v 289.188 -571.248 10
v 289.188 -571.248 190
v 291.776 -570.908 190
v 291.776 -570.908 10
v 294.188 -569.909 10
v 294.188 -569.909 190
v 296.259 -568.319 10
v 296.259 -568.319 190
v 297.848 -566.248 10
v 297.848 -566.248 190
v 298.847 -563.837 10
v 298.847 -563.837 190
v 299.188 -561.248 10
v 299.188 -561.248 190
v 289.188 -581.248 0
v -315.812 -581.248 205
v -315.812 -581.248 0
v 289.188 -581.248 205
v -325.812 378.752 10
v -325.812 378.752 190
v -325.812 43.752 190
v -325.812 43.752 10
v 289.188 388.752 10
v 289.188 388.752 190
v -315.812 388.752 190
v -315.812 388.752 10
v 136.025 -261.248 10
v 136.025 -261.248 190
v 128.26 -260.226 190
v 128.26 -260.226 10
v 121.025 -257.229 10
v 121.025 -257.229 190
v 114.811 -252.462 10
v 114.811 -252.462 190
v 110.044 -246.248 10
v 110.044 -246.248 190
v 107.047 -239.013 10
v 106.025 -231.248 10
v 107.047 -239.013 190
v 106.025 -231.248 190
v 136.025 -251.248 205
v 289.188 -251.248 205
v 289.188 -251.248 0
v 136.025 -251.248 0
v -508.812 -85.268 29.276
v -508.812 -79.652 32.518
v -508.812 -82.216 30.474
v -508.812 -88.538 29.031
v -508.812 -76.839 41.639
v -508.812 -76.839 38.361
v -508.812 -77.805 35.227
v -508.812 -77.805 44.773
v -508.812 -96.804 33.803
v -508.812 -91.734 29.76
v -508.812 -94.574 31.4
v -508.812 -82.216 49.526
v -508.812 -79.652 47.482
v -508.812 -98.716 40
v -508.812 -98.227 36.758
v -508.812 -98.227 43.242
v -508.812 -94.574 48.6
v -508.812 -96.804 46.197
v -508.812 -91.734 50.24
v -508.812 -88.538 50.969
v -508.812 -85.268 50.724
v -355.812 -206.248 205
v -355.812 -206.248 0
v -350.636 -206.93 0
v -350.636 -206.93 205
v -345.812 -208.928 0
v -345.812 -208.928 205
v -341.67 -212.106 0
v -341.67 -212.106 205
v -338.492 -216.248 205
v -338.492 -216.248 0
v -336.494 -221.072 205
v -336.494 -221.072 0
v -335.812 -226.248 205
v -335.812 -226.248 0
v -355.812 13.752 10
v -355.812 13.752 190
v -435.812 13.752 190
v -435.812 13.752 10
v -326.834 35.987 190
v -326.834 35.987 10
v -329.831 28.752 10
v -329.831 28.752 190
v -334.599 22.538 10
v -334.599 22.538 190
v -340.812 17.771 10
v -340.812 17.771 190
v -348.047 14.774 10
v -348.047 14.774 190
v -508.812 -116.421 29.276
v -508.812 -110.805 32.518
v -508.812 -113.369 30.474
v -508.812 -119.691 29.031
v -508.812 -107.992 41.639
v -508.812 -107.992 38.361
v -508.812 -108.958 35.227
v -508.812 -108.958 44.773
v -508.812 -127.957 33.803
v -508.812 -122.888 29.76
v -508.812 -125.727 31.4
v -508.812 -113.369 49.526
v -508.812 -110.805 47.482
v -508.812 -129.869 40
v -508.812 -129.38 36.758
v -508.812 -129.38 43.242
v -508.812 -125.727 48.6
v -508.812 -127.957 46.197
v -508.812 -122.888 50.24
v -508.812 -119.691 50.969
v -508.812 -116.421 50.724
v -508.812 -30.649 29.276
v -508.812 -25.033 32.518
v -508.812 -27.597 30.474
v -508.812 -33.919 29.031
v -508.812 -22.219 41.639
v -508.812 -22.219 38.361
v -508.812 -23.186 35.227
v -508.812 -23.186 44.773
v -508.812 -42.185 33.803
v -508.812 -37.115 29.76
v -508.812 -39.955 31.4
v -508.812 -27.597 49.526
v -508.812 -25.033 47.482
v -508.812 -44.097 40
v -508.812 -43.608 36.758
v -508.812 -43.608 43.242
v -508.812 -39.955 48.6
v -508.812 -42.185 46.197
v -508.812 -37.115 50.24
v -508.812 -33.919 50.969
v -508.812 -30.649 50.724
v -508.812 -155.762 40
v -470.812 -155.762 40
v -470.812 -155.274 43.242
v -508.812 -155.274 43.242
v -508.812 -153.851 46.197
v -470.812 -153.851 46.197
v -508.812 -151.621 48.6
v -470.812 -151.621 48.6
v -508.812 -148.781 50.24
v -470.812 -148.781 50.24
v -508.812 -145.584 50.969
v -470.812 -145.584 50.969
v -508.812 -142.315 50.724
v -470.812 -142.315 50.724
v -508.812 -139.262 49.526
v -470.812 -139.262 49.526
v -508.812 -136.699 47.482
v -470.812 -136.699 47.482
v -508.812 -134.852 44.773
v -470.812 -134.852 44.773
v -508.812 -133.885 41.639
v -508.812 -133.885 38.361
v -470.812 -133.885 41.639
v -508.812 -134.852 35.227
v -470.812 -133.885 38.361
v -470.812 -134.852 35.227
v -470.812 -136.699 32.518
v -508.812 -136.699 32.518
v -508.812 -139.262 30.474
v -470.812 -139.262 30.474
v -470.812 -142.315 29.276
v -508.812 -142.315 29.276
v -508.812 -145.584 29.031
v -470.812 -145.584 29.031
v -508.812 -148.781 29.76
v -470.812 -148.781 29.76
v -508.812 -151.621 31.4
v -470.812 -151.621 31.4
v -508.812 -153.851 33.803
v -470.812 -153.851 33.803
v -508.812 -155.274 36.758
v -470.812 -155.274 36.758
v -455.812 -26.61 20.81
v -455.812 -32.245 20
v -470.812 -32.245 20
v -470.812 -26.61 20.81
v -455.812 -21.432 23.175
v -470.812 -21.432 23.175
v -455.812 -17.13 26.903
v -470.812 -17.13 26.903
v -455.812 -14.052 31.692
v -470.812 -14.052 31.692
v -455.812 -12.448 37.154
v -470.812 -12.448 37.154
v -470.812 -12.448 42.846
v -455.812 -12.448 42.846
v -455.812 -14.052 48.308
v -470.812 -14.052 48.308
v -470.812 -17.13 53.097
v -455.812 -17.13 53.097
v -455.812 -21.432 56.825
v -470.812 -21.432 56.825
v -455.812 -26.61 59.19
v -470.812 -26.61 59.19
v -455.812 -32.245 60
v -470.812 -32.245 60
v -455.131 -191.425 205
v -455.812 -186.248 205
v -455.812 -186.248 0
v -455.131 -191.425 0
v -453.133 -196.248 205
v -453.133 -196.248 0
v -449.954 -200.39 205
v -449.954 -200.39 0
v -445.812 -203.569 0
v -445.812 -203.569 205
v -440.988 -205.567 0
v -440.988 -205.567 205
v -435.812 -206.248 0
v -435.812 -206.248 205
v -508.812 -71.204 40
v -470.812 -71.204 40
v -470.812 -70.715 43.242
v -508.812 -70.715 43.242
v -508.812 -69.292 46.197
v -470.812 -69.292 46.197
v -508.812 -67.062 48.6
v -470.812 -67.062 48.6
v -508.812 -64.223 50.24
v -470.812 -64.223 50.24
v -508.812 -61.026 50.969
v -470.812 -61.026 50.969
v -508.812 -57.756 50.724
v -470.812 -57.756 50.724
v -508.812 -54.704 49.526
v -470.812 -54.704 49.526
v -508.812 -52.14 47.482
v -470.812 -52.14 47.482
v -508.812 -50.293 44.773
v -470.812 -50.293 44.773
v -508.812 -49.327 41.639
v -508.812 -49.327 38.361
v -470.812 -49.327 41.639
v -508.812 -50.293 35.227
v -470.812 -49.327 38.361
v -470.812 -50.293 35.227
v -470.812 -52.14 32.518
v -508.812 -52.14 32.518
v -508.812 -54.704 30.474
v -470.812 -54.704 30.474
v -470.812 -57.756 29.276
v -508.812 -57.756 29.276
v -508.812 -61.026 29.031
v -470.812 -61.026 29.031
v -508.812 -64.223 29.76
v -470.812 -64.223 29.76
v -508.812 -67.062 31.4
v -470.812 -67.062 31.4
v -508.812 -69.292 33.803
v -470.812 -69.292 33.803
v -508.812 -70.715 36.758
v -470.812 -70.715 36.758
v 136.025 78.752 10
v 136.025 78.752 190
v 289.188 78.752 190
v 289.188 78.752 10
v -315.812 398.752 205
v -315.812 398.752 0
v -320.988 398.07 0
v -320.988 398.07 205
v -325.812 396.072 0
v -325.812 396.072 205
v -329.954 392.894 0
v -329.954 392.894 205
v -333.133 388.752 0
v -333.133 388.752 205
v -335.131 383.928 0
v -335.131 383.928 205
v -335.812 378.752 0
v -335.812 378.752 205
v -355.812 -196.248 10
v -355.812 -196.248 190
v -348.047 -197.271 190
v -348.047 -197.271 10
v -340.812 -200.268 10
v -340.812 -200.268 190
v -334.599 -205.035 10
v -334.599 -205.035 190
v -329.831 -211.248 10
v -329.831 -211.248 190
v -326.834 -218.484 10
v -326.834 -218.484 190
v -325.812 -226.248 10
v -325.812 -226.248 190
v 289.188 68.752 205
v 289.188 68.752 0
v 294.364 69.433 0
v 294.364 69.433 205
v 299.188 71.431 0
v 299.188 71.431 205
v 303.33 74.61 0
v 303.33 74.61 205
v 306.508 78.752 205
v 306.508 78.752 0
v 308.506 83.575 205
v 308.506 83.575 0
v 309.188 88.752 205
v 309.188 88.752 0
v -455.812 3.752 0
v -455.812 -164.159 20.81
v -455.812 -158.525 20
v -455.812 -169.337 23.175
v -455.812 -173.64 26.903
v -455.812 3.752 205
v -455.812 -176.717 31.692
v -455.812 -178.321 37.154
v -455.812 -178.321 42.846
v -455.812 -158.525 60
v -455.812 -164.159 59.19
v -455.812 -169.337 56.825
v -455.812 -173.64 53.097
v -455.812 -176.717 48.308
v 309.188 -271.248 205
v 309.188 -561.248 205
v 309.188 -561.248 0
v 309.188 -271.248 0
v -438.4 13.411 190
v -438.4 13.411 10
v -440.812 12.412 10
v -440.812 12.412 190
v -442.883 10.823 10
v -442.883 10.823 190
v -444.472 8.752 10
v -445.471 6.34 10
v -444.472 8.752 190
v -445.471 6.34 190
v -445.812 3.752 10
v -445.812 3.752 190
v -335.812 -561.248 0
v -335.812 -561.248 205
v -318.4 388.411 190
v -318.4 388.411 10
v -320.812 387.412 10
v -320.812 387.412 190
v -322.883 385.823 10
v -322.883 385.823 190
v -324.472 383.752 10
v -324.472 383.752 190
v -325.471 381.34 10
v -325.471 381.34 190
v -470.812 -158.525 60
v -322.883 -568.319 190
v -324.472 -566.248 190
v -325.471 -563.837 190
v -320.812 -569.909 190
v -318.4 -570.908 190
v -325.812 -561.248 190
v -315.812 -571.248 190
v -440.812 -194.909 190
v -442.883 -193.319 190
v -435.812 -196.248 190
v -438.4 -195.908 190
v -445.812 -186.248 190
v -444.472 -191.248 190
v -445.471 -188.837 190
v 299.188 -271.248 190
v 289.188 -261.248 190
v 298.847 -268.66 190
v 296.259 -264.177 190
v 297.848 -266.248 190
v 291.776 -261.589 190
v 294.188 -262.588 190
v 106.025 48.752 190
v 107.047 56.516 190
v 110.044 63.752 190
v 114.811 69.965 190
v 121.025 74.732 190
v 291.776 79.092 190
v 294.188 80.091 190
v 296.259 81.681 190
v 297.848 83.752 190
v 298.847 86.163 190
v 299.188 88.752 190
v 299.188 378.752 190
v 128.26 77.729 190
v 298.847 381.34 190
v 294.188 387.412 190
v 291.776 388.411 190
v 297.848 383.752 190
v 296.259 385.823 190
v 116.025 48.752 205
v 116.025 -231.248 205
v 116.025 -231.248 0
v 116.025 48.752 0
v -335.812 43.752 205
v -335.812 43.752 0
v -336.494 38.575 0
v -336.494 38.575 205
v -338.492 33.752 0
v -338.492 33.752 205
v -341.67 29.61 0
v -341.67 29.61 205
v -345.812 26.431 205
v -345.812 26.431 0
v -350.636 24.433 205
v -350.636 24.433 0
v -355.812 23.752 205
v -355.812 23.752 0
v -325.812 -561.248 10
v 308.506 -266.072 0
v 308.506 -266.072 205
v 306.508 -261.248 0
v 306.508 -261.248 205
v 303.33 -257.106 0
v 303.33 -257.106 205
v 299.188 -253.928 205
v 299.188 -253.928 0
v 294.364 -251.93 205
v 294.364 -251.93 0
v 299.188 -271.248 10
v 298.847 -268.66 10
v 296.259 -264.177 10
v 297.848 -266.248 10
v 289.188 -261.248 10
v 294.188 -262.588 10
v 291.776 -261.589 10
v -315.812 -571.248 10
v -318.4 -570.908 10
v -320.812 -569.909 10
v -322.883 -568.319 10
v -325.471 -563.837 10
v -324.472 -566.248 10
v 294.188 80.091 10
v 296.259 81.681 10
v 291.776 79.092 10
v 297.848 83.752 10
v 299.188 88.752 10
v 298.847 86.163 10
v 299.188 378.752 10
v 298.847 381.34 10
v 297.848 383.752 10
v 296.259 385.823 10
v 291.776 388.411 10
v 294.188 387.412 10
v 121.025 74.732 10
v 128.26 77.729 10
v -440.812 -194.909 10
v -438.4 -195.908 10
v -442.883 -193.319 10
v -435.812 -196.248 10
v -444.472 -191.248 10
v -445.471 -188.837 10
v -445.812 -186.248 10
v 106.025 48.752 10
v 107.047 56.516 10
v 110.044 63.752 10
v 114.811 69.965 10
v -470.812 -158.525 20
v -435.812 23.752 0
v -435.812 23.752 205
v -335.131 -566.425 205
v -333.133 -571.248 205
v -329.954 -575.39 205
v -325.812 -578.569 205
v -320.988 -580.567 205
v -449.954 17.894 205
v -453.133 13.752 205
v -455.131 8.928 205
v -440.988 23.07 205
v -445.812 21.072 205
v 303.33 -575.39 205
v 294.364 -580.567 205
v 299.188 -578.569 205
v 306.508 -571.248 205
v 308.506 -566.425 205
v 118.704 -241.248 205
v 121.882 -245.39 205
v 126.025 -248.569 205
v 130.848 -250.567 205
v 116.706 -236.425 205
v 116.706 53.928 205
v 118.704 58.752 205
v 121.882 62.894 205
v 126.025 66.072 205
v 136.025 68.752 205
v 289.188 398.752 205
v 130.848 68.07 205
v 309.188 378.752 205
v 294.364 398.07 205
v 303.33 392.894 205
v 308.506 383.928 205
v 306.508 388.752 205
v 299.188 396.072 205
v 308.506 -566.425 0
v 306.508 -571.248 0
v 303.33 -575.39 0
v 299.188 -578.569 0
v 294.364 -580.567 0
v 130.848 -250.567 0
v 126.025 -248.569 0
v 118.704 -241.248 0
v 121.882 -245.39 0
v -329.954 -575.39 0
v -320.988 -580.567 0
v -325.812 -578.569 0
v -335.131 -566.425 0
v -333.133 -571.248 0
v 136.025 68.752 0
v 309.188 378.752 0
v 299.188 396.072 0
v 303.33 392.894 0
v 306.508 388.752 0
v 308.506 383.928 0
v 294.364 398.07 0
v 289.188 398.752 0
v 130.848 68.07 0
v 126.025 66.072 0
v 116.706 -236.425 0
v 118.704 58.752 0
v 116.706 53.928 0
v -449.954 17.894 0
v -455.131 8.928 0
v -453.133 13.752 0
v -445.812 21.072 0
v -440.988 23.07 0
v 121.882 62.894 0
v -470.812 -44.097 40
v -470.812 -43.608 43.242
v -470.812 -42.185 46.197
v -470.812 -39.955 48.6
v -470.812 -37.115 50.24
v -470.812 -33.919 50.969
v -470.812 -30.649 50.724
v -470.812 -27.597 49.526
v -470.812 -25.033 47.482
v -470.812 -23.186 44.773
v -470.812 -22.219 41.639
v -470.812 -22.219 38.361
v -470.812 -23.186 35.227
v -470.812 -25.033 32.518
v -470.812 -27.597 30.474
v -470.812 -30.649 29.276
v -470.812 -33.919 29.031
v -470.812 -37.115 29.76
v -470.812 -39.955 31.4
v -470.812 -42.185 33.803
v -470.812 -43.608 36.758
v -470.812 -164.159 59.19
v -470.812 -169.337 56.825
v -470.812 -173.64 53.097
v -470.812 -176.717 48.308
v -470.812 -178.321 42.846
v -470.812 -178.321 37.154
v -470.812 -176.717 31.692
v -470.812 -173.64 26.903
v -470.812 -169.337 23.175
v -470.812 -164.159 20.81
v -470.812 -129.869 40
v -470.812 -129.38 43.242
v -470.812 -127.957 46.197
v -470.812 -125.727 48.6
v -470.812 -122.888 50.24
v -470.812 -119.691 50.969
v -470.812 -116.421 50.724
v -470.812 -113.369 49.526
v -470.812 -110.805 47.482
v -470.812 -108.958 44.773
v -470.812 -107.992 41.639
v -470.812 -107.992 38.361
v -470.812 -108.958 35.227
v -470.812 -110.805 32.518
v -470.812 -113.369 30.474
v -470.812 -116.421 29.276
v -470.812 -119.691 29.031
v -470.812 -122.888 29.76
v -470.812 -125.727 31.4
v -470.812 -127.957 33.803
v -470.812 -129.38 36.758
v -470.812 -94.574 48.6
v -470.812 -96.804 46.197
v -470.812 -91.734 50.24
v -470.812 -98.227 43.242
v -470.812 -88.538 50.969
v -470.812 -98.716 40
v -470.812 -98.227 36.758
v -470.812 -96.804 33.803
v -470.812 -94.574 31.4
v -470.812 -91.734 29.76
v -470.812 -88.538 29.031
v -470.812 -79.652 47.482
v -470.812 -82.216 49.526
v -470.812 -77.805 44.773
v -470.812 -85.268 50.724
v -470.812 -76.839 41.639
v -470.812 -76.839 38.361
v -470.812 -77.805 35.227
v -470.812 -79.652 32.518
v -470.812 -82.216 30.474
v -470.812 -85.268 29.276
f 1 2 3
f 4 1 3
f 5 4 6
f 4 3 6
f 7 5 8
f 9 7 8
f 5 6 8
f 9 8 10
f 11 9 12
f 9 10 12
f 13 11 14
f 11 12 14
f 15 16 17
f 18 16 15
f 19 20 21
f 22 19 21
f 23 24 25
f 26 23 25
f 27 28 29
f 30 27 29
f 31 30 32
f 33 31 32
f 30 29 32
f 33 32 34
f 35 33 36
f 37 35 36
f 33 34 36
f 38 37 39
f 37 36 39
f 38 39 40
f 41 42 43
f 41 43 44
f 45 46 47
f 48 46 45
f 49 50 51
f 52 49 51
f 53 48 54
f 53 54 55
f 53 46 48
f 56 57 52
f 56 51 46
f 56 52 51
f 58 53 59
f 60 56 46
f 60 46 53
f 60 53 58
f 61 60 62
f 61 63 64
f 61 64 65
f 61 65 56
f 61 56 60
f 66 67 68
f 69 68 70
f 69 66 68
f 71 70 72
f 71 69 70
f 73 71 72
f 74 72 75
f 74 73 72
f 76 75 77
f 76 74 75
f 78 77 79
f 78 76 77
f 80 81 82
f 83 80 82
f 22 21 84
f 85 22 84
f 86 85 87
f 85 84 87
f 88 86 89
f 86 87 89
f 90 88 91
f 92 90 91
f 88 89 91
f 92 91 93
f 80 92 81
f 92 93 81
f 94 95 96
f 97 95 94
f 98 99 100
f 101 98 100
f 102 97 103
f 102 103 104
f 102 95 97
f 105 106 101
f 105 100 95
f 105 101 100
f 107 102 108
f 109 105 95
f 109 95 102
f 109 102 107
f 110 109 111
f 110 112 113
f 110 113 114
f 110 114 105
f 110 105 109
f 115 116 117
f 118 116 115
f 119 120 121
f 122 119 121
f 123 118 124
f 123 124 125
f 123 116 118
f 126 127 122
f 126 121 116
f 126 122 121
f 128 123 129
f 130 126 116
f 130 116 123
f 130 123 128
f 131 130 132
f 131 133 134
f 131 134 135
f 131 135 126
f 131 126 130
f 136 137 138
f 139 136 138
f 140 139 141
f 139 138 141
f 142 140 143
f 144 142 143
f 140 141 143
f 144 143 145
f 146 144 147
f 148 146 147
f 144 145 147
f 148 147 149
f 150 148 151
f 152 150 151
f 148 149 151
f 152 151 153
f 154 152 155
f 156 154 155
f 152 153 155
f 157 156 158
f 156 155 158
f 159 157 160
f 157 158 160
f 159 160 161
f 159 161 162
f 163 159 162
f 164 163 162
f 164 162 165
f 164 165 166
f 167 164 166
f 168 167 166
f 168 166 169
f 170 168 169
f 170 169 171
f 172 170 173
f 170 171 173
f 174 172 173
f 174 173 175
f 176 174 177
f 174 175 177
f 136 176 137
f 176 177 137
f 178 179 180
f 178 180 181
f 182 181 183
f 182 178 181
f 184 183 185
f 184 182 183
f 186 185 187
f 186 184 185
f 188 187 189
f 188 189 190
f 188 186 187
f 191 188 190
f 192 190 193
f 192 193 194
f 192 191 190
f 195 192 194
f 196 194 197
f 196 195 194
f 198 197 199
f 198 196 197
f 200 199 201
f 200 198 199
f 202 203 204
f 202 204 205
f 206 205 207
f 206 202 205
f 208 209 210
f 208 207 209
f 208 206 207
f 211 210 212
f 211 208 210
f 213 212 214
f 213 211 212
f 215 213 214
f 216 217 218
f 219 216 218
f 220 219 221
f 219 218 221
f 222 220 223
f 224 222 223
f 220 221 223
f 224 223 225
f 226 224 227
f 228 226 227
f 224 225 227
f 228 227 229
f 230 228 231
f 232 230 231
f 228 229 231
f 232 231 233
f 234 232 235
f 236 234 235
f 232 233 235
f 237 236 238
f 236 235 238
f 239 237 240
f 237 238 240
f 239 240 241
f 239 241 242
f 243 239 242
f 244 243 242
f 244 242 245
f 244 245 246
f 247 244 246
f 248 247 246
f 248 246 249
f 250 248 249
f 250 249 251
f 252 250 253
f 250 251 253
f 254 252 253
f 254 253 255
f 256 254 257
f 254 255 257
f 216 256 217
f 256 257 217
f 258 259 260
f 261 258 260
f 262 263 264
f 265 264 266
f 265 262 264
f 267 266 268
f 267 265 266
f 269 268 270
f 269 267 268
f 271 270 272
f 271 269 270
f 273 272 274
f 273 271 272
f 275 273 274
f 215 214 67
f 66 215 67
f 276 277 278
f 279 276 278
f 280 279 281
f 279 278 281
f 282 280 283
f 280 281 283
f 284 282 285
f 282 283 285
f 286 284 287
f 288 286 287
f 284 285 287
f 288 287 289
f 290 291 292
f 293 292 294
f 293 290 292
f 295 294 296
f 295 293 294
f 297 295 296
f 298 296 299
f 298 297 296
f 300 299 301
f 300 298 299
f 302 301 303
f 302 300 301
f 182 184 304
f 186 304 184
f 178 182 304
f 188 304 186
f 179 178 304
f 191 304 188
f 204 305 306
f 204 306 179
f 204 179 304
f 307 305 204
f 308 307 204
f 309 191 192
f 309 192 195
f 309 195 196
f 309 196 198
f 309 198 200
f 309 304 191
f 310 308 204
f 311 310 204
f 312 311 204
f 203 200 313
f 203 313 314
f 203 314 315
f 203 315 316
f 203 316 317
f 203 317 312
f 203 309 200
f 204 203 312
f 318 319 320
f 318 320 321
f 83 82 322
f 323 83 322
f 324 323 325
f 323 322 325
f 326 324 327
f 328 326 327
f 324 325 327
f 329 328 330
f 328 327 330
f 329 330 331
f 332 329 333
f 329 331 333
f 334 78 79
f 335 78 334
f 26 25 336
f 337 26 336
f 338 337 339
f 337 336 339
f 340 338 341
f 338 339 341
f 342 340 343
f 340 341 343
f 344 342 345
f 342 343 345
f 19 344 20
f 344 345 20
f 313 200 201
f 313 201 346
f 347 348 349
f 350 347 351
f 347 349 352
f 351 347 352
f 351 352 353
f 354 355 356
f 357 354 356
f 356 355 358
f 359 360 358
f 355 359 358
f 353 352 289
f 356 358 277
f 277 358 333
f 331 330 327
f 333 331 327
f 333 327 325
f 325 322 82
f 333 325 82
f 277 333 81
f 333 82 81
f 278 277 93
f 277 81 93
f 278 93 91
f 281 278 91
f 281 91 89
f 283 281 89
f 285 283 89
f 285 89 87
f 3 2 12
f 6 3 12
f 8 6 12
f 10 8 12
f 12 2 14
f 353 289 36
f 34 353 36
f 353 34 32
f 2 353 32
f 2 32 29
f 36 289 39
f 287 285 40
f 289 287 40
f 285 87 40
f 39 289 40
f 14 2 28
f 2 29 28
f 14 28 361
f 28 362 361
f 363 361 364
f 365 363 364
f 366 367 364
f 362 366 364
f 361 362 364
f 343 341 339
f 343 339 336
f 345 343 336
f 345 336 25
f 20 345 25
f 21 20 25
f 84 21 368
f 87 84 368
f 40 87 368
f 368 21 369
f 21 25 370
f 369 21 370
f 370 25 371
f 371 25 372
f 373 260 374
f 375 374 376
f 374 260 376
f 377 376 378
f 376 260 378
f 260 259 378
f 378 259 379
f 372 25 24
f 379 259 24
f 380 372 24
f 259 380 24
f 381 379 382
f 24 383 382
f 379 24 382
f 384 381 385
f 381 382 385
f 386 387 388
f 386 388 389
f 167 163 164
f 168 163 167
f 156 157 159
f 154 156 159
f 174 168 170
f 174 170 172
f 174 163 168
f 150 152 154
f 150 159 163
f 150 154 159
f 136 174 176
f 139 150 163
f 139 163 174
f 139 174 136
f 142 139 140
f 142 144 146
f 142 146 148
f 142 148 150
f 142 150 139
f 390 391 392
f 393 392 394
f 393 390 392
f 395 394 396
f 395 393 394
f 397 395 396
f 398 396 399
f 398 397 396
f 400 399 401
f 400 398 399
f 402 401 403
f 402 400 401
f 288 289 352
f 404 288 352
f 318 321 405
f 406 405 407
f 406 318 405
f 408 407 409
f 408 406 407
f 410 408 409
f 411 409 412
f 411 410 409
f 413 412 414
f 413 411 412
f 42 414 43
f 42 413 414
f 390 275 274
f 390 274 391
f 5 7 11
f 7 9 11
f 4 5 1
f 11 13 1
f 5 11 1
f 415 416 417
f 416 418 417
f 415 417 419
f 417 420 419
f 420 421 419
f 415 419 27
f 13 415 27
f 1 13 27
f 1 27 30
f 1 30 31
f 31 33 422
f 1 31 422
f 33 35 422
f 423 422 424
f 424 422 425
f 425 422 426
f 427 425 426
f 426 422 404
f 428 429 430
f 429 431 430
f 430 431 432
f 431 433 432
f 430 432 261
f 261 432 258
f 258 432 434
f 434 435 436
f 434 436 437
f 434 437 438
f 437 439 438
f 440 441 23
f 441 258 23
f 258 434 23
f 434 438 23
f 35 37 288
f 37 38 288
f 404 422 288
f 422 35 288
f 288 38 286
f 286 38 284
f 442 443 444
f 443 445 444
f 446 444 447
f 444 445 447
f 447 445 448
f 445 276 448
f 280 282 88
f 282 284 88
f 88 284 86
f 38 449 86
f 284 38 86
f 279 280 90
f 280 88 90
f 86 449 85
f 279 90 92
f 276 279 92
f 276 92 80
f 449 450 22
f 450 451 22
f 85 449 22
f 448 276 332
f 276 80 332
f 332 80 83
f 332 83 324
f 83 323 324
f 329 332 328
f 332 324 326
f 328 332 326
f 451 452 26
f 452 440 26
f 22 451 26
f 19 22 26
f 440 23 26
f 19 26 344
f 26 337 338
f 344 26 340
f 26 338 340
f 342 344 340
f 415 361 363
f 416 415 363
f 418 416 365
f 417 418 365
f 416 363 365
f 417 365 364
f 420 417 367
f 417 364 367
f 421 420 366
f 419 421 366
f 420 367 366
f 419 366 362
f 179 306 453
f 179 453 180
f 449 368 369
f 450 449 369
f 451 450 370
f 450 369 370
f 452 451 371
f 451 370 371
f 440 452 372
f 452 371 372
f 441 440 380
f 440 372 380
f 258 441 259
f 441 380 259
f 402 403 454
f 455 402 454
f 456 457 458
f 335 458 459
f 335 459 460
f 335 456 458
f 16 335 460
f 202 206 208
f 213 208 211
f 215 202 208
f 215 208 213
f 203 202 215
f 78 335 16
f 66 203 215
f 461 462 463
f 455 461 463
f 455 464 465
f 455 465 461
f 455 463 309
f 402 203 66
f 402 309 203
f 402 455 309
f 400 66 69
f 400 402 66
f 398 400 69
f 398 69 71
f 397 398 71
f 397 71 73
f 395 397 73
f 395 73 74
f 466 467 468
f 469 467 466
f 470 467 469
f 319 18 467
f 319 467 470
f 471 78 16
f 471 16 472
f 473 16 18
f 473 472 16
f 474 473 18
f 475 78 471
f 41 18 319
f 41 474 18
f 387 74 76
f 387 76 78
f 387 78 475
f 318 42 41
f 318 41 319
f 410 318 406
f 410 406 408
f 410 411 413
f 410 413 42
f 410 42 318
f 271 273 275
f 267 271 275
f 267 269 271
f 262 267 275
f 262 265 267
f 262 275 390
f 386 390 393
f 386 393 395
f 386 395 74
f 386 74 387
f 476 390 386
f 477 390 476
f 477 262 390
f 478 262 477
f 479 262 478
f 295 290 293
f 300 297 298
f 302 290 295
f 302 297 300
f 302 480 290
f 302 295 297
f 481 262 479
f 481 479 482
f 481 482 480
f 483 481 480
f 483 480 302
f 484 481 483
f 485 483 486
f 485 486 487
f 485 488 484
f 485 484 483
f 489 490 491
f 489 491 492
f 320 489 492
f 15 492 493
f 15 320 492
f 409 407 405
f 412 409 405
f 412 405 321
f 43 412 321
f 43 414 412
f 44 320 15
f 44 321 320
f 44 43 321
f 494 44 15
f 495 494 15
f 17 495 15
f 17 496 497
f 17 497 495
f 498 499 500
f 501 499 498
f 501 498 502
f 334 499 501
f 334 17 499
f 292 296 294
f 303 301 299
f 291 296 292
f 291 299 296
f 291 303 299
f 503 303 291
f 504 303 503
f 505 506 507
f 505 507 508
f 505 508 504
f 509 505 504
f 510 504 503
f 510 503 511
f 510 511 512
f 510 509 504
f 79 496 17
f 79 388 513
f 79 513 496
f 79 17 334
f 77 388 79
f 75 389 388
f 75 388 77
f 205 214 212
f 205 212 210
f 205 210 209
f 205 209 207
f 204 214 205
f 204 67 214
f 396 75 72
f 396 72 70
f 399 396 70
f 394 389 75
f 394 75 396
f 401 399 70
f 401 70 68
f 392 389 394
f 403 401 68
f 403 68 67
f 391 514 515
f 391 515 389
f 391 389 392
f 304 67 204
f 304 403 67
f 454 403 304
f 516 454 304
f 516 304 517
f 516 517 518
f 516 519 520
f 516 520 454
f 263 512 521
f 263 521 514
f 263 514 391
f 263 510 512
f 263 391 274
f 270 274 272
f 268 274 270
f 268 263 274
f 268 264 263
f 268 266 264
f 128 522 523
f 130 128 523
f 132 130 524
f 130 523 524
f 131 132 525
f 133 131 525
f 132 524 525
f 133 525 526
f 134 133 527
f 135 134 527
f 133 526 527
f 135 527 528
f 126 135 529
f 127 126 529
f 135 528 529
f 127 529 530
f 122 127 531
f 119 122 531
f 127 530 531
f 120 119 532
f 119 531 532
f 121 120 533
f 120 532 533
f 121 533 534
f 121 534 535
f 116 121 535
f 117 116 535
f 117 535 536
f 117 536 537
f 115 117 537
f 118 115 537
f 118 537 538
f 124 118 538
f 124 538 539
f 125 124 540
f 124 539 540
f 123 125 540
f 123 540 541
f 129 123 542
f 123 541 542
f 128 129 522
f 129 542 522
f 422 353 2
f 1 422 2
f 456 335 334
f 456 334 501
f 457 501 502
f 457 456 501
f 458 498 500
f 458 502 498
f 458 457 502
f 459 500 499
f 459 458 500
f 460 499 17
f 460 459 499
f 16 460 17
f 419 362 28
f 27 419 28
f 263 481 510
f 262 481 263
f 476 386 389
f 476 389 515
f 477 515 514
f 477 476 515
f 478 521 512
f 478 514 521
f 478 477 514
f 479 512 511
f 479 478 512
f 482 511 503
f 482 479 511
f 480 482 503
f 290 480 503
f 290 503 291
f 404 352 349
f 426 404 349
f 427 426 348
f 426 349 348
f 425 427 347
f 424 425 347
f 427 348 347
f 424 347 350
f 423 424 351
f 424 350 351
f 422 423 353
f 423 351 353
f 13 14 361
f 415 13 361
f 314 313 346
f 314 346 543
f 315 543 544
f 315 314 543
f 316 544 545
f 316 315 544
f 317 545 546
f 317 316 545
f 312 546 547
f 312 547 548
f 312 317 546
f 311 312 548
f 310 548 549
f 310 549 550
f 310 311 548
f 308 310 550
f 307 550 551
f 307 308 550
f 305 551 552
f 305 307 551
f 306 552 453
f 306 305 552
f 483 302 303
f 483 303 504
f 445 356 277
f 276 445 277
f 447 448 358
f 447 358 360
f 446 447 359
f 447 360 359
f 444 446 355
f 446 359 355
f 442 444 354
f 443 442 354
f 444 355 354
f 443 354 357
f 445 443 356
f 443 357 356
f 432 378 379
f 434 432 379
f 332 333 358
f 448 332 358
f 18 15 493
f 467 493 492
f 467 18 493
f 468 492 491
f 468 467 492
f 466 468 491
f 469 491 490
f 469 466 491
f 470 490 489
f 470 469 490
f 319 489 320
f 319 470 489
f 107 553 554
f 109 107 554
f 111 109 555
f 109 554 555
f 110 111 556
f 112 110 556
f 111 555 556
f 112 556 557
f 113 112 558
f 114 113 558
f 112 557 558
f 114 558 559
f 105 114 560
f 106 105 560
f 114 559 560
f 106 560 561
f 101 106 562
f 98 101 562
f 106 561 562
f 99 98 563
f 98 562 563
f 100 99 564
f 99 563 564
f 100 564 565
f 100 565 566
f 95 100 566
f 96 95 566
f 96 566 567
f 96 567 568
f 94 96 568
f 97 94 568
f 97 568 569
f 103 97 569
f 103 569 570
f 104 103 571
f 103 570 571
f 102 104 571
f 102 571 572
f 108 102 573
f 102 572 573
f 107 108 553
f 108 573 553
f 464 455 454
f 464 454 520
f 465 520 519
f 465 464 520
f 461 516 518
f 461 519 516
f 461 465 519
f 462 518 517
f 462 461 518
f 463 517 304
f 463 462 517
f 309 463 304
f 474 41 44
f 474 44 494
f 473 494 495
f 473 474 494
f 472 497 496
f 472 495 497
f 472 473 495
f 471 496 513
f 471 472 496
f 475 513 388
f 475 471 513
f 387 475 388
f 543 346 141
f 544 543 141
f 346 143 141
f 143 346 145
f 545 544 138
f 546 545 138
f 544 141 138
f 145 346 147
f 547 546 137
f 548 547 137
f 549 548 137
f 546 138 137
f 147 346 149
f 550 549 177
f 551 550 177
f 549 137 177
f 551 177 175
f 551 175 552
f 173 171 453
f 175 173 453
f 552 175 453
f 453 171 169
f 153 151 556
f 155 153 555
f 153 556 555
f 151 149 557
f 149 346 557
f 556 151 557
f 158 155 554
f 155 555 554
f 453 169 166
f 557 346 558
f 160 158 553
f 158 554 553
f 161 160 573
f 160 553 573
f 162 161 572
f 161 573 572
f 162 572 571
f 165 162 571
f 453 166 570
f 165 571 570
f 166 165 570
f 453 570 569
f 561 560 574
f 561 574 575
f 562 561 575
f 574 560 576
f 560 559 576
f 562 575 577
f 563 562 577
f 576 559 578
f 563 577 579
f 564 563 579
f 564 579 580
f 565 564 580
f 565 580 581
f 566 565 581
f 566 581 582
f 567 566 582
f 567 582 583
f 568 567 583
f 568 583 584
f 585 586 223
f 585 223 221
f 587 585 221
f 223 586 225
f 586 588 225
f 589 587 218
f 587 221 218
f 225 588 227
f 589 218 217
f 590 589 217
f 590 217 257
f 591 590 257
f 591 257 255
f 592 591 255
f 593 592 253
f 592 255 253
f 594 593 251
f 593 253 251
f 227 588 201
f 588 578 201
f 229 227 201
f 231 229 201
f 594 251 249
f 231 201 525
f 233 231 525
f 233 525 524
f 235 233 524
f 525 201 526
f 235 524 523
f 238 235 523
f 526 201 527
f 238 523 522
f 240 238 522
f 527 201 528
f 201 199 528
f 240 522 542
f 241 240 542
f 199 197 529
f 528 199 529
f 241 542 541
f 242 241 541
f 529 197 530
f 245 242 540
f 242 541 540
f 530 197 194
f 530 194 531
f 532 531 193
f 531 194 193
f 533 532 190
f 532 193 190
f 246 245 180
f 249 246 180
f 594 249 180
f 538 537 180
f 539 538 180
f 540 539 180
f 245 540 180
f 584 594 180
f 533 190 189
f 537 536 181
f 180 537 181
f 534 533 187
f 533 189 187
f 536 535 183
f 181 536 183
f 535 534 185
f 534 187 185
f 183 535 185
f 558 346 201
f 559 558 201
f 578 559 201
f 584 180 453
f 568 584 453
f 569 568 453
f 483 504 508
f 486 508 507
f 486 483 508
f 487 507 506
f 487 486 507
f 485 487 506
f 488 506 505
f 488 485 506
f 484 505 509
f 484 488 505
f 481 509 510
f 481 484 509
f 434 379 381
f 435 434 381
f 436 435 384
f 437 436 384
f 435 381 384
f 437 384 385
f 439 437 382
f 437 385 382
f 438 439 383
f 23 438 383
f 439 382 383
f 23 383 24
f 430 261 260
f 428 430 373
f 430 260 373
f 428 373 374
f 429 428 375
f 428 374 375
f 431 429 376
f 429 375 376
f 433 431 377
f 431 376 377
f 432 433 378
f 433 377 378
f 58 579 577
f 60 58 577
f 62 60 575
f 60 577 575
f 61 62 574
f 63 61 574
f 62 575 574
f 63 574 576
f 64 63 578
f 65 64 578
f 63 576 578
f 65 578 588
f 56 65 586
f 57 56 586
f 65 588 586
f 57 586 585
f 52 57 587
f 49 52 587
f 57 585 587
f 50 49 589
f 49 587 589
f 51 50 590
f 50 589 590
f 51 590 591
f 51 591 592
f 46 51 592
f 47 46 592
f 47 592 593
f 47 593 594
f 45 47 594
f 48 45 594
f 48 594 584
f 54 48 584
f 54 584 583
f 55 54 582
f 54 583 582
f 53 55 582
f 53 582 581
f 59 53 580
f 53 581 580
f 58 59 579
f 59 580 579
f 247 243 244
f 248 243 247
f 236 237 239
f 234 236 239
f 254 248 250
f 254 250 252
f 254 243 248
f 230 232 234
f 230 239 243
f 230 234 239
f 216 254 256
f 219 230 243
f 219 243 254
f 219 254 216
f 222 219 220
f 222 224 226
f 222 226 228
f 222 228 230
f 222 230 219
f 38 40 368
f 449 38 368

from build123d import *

# Parameters (mm, degrees)
BOSS_EXTRUDE1_DEPTH = 10
FILLET1_R           = 20
BOSS_EXTRUDE2_START = 180
BOSS_EXTRUDE2_DEPTH = 180
BOSS_EXTRUDE3_START = 15
BOSS_EXTRUDE3_DEPTH = 15
BOSS_EXTRUDE4_DEPTH = 15
BOSS_EXTRUDE5_START = 15
SKETCH4_3_R         = 11
BOSS_EXTRUDE5_DEPTH = 38


with BuildPart() as part:
    # Sketch1 → Boss-Extrude1 (new body)
    with BuildSketch(Plane.XY):
        Polygon((-335.812036678, 398.75165032), (309.187963322, 398.75165032), (309.187963322, 68.75165032), (116.024594022, 68.75165032), (116.024594022, -251.24834968), (309.187963322, -251.24834968), (309.187963322, -581.24834968), (-335.812036678, -581.24834968), (-335.812036678, -206.24834968), (-455.812036678, -206.24834968), (-455.812036678, 23.75165032), (-335.812036678, 23.75165032), align=None)
    extrude(amount=BOSS_EXTRUDE1_DEPTH)

    # Fillet1
    fillet1_edges = [part.edges().sort_by_distance(p)[0] for p in [
        (-335.812036678, -206.24834968, 5),
        (-455.812036678, -206.24834968, 5),
        (-455.812036678, 23.75165032, 5),
        (-335.812036678, 23.75165032, 5),
        (-335.812036678, 398.75165032, 5),
        (309.187963322, 398.75165032, 5),
        (309.187963322, 68.75165032, 5),
        (116.024594022, 68.75165032, 5),
        (116.024594022, -251.24834968, 5),
        (309.187963322, -251.24834968, 5),
        (309.187963322, -581.24834968, 5),
        (-335.812036678, -581.24834968, 5),
    ]]
    fillet(fillet1_edges, radius=FILLET1_R)

    # Sketch2 → Boss-Extrude2 (add)
    with BuildSketch(Plane.XY.offset(10).offset(BOSS_EXTRUDE2_START)):
        with BuildLine():
            Line((309.187963322, 88.75165032), (309.187963322, 378.75165032))
            ThreePointArc((309.187963322, 378.75165032), (303.330098945, 392.893785944), (289.187963322, 398.75165032))
            Line((289.187963322, 398.75165032), (-315.812036678, 398.75165032))
            ThreePointArc((-315.812036678, 398.75165032), (-329.954172302, 392.893785944), (-335.812036678, 378.75165032))
            Line((-335.812036678, 378.75165032), (-335.812036678, 43.75165032))
            ThreePointArc((-335.812036678, 43.75165032), (-341.669901055, 29.609514696), (-355.812036678, 23.75165032))
            Line((-355.812036678, 23.75165032), (-435.812036678, 23.75165032))
            ThreePointArc((-435.812036678, 23.75165032), (-449.954172302, 17.893785944), (-455.812036678, 3.75165032))
            Line((-455.812036678, 3.75165032), (-455.812036678, -186.24834968))
            ThreePointArc((-455.812036678, -186.24834968), (-449.954172302, -200.390485304), (-435.812036678, -206.24834968))
            Line((-435.812036678, -206.24834968), (-355.812036678, -206.24834968))
            ThreePointArc((-355.812036678, -206.24834968), (-341.669901055, -212.106214056), (-335.812036678, -226.24834968))
            Line((-335.812036678, -226.24834968), (-335.812036678, -561.24834968))
            ThreePointArc((-335.812036678, -561.24834968), (-329.954172302, -575.390485304), (-315.812036678, -581.24834968))
            Line((-315.812036678, -581.24834968), (289.187963322, -581.24834968))
            ThreePointArc((289.187963322, -581.24834968), (303.330098945, -575.390485304), (309.187963322, -561.24834968))
            Line((309.187963322, -561.24834968), (309.187963322, -271.24834968))
            ThreePointArc((309.187963322, -271.24834968), (303.330098945, -257.106214056), (289.187963322, -251.24834968))
            Line((289.187963322, -251.24834968), (136.024594022, -251.24834968))
            ThreePointArc((136.024594022, -251.24834968), (121.882458398, -245.390485304), (116.024594022, -231.24834968))
            Line((116.024594022, -231.24834968), (116.024594022, 48.75165032))
            ThreePointArc((116.024594022, 48.75165032), (121.882458398, 62.893785944), (136.024594022, 68.75165032))
            Line((136.024594022, 68.75165032), (289.187963322, 68.75165032))
            ThreePointArc((289.187963322, 68.75165032), (303.330098945, 74.609514696), (309.187963322, 88.75165032))
        make_face()
        with BuildLine():
            Line((299.187963322, 88.75165032), (299.187963322, 378.75165032))
            ThreePointArc((299.187963322, 378.75165032), (296.259031134, 385.822718132), (289.187963322, 388.75165032))
            Line((289.187963322, 388.75165032), (-315.812036678, 388.75165032))
            ThreePointArc((-315.812036678, 388.75165032), (-322.88310449, 385.822718132), (-325.812036678, 378.75165032))
            Line((-325.812036678, 378.75165032), (-325.812036678, 43.75165032))
            ThreePointArc((-325.812036678, 43.75165032), (-334.598833243, 22.538446884), (-355.812036678, 13.75165032))
            Line((-355.812036678, 13.75165032), (-435.812036678, 13.75165032))
            ThreePointArc((-435.812036678, 13.75165032), (-442.88310449, 10.822718132), (-445.812036678, 3.75165032))
            Line((-445.812036678, 3.75165032), (-445.812036678, -186.24834968))
            ThreePointArc((-445.812036678, -186.24834968), (-442.88310449, -193.319417492), (-435.812036678, -196.24834968))
            Line((-435.812036678, -196.24834968), (-355.812036678, -196.24834968))
            ThreePointArc((-355.812036678, -196.24834968), (-334.598833243, -205.035146245), (-325.812036678, -226.24834968))
            Line((-325.812036678, -226.24834968), (-325.812036678, -561.24834968))
            ThreePointArc((-325.812036678, -561.24834968), (-322.88310449, -568.319417492), (-315.812036678, -571.24834968))
            Line((-315.812036678, -571.24834968), (289.187963322, -571.24834968))
            ThreePointArc((289.187963322, -571.24834968), (296.259031134, -568.319417492), (299.187963322, -561.24834968))
            Line((299.187963322, -561.24834968), (299.187963322, -271.24834968))
            ThreePointArc((299.187963322, -271.24834968), (296.259031134, -264.177281868), (289.187963322, -261.24834968))
            Line((289.187963322, -261.24834968), (136.024594022, -261.24834968))
            ThreePointArc((136.024594022, -261.24834968), (114.811390587, -252.461553116), (106.024594022, -231.24834968))
            Line((106.024594022, -231.24834968), (106.024594022, 48.75165032))
            ThreePointArc((106.024594022, 48.75165032), (114.811390587, 69.964853755), (136.024594022, 78.75165032))
            Line((136.024594022, 78.75165032), (289.187963322, 78.75165032))
            ThreePointArc((289.187963322, 78.75165032), (296.259031134, 81.680582508), (299.187963322, 88.75165032))
        make_face(mode=Mode.SUBTRACT)
    extrude(amount=-BOSS_EXTRUDE2_DEPTH)

    # Sketch3 → Boss-Extrude3 (add)
    with BuildSketch(Plane.XY.offset(190).offset(BOSS_EXTRUDE3_START)):
        with BuildLine():
            Line((309.187963322, 88.75165032), (309.187963322, 378.75165032))
            ThreePointArc((309.187963322, 378.75165032), (303.330098945, 392.893785944), (289.187963322, 398.75165032))
            Line((289.187963322, 398.75165032), (-315.812036678, 398.75165032))
            ThreePointArc((-315.812036678, 398.75165032), (-329.954172302, 392.893785944), (-335.812036678, 378.75165032))
            Line((-335.812036678, 378.75165032), (-335.812036678, 43.75165032))
            ThreePointArc((-335.812036678, 43.75165032), (-341.669901055, 29.609514696), (-355.812036678, 23.75165032))
            Line((-355.812036678, 23.75165032), (-435.812036678, 23.75165032))
            ThreePointArc((-435.812036678, 23.75165032), (-449.954172302, 17.893785944), (-455.812036678, 3.75165032))
            Line((-455.812036678, 3.75165032), (-455.812036678, -186.24834968))
            ThreePointArc((-455.812036678, -186.24834968), (-449.954172302, -200.390485304), (-435.812036678, -206.24834968))
            Line((-435.812036678, -206.24834968), (-355.812036678, -206.24834968))
            ThreePointArc((-355.812036678, -206.24834968), (-341.669901055, -212.106214056), (-335.812036678, -226.24834968))
            Line((-335.812036678, -226.24834968), (-335.812036678, -561.24834968))
            ThreePointArc((-335.812036678, -561.24834968), (-329.954172302, -575.390485304), (-315.812036678, -581.24834968))
            Line((-315.812036678, -581.24834968), (289.187963322, -581.24834968))
            ThreePointArc((289.187963322, -581.24834968), (303.330098945, -575.390485304), (309.187963322, -561.24834968))
            Line((309.187963322, -561.24834968), (309.187963322, -271.24834968))
            ThreePointArc((309.187963322, -271.24834968), (303.330098945, -257.106214056), (289.187963322, -251.24834968))
            Line((289.187963322, -251.24834968), (136.024594022, -251.24834968))
            ThreePointArc((136.024594022, -251.24834968), (121.882458398, -245.390485304), (116.024594022, -231.24834968))
            Line((116.024594022, -231.24834968), (116.024594022, 48.75165032))
            ThreePointArc((116.024594022, 48.75165032), (121.882458398, 62.893785944), (136.024594022, 68.75165032))
            Line((136.024594022, 68.75165032), (289.187963322, 68.75165032))
            ThreePointArc((289.187963322, 68.75165032), (303.330098945, 74.609514696), (309.187963322, 88.75165032))
        make_face()
    extrude(amount=-BOSS_EXTRUDE3_DEPTH)

    # Sketch4 → Boss-Extrude4 (add)
    with BuildSketch(Plane.ZY.offset(455.812036678)):
        with BuildLine():
            Line((60, -32.244741311), (60, -158.524628982))
            ThreePointArc((60, -158.524628982), (40, -178.524628982), (20, -158.524628982))
            Line((20, -158.524628982), (20, -32.244741311))
            ThreePointArc((20, -32.244741311), (40, -12.244741311), (60, -32.244741311))
        make_face()
    extrude(amount=BOSS_EXTRUDE4_DEPTH)

    # Sketch4<3> → Boss-Extrude5 (add)
    with BuildSketch(Plane.ZY.offset(455.812036678).offset(BOSS_EXTRUDE5_START)):
        with Locations(Location((40, -144.762351153, 0), (0, 0, 270))):
            Circle(SKETCH4_3_R)
        with Locations(Location((40, -118.868830691, 0), (0, 0, 270))):
            Circle(SKETCH4_3_R)
        with Locations(Location((40, -87.715688885, 0), (0, 0, 270))):
            Circle(SKETCH4_3_R)
        with Locations(Location((40, -60.203823394, 0), (0, 0, 270))):
            Circle(SKETCH4_3_R)
        with Locations(Location((40, -33.09654416, 0), (0, 0, 270))):
            Circle(SKETCH4_3_R)
    extrude(amount=BOSS_EXTRUDE5_DEPTH)


solid = part.part
